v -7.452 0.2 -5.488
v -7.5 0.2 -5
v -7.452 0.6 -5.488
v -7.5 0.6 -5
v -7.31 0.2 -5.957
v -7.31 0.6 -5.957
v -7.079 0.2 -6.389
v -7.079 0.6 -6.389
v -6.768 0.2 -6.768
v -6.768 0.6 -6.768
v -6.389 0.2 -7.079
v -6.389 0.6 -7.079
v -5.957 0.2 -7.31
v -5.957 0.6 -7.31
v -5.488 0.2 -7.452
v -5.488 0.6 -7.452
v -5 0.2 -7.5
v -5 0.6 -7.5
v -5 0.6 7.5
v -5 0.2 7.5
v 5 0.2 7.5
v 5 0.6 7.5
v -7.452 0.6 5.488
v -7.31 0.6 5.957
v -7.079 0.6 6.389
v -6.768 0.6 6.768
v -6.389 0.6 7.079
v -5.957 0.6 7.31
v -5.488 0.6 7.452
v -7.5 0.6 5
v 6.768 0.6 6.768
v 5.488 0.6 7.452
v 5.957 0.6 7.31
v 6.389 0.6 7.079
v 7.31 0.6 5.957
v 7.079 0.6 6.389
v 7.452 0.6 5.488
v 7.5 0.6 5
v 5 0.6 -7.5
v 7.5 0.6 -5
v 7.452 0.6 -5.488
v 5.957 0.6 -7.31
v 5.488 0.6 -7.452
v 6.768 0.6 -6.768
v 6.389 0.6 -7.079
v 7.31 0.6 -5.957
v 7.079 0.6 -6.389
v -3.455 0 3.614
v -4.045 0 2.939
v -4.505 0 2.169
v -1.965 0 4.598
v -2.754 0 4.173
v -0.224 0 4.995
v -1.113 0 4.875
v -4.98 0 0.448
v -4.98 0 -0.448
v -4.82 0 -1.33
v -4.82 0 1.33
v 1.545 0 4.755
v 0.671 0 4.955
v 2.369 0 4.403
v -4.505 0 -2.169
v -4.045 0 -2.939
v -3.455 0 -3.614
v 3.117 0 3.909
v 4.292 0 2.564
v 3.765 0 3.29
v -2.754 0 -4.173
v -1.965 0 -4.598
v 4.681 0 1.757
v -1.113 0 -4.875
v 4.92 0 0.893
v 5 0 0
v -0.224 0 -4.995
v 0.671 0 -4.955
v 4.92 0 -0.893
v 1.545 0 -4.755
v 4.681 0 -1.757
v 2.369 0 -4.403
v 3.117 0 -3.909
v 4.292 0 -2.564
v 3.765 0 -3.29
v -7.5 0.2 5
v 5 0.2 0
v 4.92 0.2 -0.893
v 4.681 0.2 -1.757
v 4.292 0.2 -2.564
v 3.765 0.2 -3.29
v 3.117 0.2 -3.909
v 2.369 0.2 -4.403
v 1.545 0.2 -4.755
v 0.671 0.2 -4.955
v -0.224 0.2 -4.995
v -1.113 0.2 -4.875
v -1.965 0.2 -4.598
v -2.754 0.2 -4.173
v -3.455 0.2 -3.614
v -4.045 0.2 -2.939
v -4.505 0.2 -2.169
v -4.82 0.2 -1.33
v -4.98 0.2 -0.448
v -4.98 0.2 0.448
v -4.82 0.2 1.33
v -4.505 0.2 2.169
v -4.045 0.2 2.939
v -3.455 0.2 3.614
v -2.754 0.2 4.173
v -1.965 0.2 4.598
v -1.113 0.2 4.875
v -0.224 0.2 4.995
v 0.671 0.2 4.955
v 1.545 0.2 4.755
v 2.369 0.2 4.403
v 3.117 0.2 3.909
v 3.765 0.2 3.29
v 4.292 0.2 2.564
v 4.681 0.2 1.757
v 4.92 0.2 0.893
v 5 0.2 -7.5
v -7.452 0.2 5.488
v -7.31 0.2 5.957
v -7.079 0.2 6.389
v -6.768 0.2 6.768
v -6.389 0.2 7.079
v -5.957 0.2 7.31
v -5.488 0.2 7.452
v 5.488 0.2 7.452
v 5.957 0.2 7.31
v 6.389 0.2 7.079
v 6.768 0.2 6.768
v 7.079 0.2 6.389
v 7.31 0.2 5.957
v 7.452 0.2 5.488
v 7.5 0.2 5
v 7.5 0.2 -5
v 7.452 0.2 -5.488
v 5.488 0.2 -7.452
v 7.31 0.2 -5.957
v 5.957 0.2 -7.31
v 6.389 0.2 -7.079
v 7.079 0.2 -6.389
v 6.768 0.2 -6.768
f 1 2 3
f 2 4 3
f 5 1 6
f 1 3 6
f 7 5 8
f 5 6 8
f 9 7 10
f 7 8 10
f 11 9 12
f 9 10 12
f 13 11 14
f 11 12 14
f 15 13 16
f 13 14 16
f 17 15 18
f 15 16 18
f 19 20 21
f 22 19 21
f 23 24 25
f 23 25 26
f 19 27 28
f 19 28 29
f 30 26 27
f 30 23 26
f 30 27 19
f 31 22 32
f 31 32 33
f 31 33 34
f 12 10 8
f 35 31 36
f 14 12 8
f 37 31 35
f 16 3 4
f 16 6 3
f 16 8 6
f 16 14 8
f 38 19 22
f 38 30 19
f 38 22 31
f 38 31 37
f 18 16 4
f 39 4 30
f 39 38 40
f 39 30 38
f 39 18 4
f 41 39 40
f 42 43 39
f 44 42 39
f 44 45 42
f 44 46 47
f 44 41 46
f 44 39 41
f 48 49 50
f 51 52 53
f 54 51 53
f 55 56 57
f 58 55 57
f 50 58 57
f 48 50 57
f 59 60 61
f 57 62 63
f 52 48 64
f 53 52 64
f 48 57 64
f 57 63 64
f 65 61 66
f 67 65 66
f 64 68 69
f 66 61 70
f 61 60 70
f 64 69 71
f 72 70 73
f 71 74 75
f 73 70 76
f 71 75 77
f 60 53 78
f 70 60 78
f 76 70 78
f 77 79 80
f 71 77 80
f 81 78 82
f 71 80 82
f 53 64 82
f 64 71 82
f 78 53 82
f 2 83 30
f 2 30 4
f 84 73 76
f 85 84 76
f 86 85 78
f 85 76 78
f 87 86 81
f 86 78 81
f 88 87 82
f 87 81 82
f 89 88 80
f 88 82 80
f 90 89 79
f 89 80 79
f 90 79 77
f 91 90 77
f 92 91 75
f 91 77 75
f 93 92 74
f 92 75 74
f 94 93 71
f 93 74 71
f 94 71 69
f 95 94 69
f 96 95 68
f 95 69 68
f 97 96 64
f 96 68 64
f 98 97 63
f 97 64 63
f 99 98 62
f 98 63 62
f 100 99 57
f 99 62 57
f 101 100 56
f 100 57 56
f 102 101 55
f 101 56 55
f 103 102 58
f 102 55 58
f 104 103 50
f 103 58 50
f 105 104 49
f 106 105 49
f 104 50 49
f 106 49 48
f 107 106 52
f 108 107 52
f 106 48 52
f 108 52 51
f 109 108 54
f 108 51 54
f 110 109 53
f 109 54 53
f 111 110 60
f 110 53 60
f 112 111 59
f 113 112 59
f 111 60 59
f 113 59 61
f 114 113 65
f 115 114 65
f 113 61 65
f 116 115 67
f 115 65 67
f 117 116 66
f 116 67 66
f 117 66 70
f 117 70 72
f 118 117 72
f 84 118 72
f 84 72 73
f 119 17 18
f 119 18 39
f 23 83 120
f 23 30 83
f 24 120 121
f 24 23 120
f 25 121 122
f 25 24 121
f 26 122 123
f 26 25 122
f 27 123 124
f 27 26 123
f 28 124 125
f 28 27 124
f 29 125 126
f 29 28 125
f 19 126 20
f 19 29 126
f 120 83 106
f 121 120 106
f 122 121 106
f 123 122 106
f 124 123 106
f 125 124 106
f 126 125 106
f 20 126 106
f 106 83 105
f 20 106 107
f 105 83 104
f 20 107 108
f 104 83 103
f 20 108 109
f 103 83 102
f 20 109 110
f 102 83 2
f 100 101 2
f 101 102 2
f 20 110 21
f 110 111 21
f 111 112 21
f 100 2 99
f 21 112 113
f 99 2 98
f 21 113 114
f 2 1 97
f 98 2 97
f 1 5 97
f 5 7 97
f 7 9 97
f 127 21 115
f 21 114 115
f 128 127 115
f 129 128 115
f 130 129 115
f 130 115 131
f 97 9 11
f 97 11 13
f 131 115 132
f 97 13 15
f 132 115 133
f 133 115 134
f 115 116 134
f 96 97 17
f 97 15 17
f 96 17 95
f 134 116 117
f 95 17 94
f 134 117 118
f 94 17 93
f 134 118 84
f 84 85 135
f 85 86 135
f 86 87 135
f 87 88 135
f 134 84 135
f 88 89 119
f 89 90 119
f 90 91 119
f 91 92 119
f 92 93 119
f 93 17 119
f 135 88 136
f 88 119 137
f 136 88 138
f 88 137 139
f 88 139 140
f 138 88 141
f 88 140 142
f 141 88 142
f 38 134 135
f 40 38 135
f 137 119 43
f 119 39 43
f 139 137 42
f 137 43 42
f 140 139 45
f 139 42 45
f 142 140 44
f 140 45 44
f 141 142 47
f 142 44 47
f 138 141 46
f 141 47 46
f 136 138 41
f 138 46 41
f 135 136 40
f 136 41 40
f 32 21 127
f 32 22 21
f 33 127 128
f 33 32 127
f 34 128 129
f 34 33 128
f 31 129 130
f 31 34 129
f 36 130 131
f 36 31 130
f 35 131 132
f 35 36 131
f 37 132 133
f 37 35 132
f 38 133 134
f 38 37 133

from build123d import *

# Parameters (mm, degrees)
SKETCH1_R           = 5
BOSS_EXTRUDE1_DEPTH = 0.2
SKETCH2_W           = 15
SKETCH2_H           = 15
BOSS_EXTRUDE2_DEPTH = 0.4
FILLET1_R           = 2.5


with BuildPart() as part:
    # Sketch1 → Boss-Extrude1 (new body)
    with BuildSketch(Plane(origin=(0, 0, 0), x_dir=(1, 0, 0), z_dir=(0, 1, 0))):
        Circle(SKETCH1_R)
    extrude(amount=BOSS_EXTRUDE1_DEPTH)

    # Sketch2 → Boss-Extrude2 (add)
    with BuildSketch(Plane(origin=(0, 0.2, 0), x_dir=(1, 0, 0), z_dir=(0, 1, 0))):
        Rectangle(SKETCH2_W, SKETCH2_H)
    extrude(amount=BOSS_EXTRUDE2_DEPTH)

    # Fillet1
    fillet1_edges = [part.edges().sort_by_distance(p)[0] for p in [
        (7.5, 0.4, 7.5),
        (7.5, 0.4, -7.5),
        (-7.5, 0.4, -7.5),
        (-7.5, 0.4, 7.5),
    ]]
    fillet(fillet1_edges, radius=FILLET1_R)


solid = part.part
